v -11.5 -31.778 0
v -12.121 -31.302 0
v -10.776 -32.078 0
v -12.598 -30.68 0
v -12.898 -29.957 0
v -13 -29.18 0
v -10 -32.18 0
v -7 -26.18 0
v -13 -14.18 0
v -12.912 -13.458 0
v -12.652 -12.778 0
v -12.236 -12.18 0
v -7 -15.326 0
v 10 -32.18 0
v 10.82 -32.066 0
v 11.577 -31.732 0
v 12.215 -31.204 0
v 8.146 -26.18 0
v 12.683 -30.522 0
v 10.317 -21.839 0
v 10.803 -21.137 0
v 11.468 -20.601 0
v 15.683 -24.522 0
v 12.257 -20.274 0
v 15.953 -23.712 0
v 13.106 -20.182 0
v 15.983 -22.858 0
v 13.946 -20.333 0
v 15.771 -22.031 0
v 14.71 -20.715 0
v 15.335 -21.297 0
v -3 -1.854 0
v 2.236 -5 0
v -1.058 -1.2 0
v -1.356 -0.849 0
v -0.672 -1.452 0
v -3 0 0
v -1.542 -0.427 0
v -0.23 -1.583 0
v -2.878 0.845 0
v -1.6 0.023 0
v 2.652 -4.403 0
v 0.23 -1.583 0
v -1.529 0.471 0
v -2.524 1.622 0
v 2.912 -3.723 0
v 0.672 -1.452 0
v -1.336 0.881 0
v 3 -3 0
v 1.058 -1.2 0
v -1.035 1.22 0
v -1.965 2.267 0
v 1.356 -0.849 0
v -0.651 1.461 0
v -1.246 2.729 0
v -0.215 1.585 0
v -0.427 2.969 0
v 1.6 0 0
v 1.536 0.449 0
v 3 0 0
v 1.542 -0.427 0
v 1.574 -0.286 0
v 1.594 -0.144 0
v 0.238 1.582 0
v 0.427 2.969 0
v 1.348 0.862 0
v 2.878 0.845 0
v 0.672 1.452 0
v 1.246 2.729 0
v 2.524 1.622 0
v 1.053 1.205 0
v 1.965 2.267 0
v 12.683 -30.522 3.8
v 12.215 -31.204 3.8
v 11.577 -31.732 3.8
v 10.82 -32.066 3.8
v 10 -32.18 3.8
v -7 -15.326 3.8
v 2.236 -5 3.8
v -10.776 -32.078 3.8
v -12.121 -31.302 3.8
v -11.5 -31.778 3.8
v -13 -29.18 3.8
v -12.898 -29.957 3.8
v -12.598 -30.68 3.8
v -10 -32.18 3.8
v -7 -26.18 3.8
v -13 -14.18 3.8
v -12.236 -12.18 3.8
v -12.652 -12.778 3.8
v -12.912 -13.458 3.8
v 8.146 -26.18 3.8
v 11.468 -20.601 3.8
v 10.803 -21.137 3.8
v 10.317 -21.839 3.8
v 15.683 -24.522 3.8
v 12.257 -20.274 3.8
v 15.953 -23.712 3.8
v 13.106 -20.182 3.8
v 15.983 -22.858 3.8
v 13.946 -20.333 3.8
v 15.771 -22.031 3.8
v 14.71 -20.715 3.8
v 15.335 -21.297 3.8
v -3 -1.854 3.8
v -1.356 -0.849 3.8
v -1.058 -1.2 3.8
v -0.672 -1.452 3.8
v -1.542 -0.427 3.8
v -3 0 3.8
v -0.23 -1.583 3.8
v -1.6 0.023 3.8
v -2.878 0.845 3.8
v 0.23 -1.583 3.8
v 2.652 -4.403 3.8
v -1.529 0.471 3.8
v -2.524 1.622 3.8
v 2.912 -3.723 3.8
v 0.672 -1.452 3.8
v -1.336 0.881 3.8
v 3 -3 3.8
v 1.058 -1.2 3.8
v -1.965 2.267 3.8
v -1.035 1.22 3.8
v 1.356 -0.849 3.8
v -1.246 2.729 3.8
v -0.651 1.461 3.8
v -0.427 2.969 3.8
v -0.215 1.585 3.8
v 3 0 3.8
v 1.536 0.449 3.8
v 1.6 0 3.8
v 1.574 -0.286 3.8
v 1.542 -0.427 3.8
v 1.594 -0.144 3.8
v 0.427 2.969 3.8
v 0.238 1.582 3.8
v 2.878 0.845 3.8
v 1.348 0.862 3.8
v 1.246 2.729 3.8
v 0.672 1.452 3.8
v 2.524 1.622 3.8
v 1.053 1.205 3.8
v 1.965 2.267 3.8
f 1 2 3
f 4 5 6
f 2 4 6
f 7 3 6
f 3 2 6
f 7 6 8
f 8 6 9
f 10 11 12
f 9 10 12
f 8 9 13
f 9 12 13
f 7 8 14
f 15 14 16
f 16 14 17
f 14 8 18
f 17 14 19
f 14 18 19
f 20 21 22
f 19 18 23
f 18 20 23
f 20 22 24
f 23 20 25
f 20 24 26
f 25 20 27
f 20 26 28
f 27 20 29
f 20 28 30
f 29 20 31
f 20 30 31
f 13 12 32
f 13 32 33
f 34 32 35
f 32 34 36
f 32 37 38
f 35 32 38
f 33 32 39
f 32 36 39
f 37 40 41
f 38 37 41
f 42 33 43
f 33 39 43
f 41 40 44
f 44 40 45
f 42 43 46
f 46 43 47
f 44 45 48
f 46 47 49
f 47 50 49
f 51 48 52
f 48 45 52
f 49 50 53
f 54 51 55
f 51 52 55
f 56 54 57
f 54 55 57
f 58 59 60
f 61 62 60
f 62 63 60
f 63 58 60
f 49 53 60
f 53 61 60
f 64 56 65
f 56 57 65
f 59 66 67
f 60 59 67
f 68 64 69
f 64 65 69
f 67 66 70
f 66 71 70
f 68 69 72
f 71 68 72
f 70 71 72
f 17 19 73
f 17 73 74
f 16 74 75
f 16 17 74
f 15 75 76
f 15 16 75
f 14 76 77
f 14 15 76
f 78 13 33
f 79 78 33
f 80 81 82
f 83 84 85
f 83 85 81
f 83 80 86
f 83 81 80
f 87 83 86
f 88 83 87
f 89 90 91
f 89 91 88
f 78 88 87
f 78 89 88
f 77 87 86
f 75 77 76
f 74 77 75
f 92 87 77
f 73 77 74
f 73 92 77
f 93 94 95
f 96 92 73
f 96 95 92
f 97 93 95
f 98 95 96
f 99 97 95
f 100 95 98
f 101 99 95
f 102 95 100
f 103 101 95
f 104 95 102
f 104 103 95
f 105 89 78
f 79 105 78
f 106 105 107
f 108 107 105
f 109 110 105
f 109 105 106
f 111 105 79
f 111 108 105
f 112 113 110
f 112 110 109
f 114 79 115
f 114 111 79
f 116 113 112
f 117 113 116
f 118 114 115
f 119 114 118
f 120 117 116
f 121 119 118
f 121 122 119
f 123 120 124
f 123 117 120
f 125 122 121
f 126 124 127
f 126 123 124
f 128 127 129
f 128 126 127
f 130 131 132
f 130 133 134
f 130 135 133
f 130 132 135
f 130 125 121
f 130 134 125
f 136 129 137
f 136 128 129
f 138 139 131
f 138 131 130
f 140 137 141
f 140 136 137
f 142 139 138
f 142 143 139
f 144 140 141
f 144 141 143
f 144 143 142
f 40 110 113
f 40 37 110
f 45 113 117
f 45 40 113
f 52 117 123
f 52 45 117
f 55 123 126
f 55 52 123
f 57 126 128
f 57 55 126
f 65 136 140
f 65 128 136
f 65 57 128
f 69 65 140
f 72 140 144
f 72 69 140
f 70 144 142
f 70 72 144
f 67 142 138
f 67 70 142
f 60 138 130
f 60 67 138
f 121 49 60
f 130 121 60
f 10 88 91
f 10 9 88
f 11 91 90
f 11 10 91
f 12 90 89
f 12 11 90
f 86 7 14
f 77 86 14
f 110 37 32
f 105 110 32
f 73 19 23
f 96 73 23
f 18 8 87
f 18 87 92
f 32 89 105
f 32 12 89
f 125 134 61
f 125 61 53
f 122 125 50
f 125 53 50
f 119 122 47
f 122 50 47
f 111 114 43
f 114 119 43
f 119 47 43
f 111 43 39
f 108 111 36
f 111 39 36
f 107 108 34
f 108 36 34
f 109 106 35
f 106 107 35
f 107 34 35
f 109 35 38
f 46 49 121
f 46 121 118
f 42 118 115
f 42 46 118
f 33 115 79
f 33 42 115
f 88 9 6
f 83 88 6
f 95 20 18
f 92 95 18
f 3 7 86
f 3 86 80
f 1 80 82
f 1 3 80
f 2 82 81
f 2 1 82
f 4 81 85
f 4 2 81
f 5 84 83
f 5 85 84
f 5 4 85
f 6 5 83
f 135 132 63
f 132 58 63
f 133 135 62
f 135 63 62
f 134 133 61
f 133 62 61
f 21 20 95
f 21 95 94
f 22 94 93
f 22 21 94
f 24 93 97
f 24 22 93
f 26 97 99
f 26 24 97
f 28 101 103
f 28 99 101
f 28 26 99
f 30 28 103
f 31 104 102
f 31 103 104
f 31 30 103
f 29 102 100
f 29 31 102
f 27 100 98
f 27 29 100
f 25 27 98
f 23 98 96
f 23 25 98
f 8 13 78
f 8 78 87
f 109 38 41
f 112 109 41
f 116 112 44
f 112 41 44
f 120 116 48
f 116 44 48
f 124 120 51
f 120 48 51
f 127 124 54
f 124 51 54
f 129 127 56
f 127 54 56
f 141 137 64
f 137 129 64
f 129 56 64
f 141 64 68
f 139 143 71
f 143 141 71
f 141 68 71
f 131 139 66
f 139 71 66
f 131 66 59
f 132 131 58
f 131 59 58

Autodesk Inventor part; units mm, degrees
ref_plane "YZ Plane" through (0, 0, 0) normal (1, 0, 0) x (0, 1, 0)
ref_plane "XZ Plane" through (0, 0, 0) normal (0, 1, 0) x (-1, 0, 0)
ref_plane "XY Plane" through (0, 0, 0) normal (0, 0, 1) x (1, 0, 0)
sketch "Sketch1" plane through (0, 0, 0) normal (0, 0, 1) x (1, 0, 0)
  circle A0 centre (0, 0) radius 1.6
  arc A1 (3, 0) -> (-3, 0) centre (0, 0) ccw
  line L0 (-3, 0) -> (-3, -1.8541)
  line L1 (-3, -3) -> (3, -3) construction
  line L2 (3, -3) -> (3, 0)
  arc A2 (-2.2361, -1) -> (-3, -3) centre (0, -3) ccw construction
  arc A3 (-13, -29.1803) -> (-10, -32.1803) centre (-10, -29.1803) ccw
  arc A4 (7, -29.1803) -> (12.6833, -30.522) centre (10, -29.1803) ccw
  arc A5 (15.6833, -24.522) -> (10.3167, -21.8387) centre (13, -23.1803) ccw
  arc A6 (-12.2361, -12.1803) -> (-13, -14.1803) centre (-10, -14.1803) ccw
  line L3 (-10, -29.1803) -> (10, -29.1803) construction
  line L4 (-7.7639, -16.1803) -> (-7, -15.3262)
  line L5 (-12.2361, -12.1803) -> (-3, -1.8541)
  line L6 (-13, -14.1803) -> (-13, -29.1803)
  line L7 (-7, -14.1803) -> (-7, -15.3262)
  line L8 (-10, -26.1803) -> (-7, -26.1803)
  line L9 (-10, -32.1803) -> (10, -32.1803)
  line L10 (10.3167, -21.8387) -> (7.3167, -27.8387)
  line L11 (12.6833, -30.522) -> (15.6833, -24.522)
  line L12 (-3, -1.8541) -> (-2.2361, -1) construction
  arc A7 (3, -3) -> (-2.2361, -1) centre (0, -3) ccw
  arc A8 (-3, -3) -> (2.2361, -5) centre (0, -3) ccw construction
  line L13 (-3, -1.8541) -> (-3, -3) construction
  arc A9 (2.2361, -5) -> (3, -3) centre (0, -3) ccw
  line L14 (-7, -15.3262) -> (2.2361, -5)
  line L15 (-7, -15.3262) -> (-7, -26.1803)
  arc A10 (-13, -14.1803) -> (-7, -14.1803) centre (-10, -14.1803) ccw construction
  line L16 (-7, -26.1803) -> (10, -26.1803)
  line L17 (-7, -26.1803) -> (-7, -29.1803)
  arc A11 (-10, -26.1803) -> (-13, -29.1803) centre (-10, -29.1803) ccw construction
  arc A12 (-10, -32.1803) -> (-10, -26.1803) centre (-10, -29.1803) ccw construction
  arc A13 (7.3167, -27.8387) -> (7, -29.1803) centre (10, -29.1803) ccw construction
  arc A14 (10, -26.1803) -> (7.3167, -27.8387) centre (10, -29.1803) ccw construction
  arc A15 (12.6833, -30.522) -> (10, -26.1803) centre (10, -29.1803) ccw construction
  arc A16 (10.3167, -21.8387) -> (15.6833, -24.522) centre (13, -23.1803) ccw construction
  point P0 (0, -29.1803)
  point P1 (8.1459, -26.1803)
  dimension "d0" = 3.2
  dimension "d1" = 6
  dimension "d2" = 3
  dimension "d3" = 6
  dimension "d4" = 6
  dimension "d5" = 6
  dimension "d6" = 6
  dimension "d7" = 15
  dimension "d8" = 6
  dimension "d9" = 15
  dimension "d10" = 20
  dimension "d11" = 3
  dimension "d12" = 6
extrude "Extrusion1" add sketch "Sketch1" along normal blind 3.8
properties part number "carlig 2"
